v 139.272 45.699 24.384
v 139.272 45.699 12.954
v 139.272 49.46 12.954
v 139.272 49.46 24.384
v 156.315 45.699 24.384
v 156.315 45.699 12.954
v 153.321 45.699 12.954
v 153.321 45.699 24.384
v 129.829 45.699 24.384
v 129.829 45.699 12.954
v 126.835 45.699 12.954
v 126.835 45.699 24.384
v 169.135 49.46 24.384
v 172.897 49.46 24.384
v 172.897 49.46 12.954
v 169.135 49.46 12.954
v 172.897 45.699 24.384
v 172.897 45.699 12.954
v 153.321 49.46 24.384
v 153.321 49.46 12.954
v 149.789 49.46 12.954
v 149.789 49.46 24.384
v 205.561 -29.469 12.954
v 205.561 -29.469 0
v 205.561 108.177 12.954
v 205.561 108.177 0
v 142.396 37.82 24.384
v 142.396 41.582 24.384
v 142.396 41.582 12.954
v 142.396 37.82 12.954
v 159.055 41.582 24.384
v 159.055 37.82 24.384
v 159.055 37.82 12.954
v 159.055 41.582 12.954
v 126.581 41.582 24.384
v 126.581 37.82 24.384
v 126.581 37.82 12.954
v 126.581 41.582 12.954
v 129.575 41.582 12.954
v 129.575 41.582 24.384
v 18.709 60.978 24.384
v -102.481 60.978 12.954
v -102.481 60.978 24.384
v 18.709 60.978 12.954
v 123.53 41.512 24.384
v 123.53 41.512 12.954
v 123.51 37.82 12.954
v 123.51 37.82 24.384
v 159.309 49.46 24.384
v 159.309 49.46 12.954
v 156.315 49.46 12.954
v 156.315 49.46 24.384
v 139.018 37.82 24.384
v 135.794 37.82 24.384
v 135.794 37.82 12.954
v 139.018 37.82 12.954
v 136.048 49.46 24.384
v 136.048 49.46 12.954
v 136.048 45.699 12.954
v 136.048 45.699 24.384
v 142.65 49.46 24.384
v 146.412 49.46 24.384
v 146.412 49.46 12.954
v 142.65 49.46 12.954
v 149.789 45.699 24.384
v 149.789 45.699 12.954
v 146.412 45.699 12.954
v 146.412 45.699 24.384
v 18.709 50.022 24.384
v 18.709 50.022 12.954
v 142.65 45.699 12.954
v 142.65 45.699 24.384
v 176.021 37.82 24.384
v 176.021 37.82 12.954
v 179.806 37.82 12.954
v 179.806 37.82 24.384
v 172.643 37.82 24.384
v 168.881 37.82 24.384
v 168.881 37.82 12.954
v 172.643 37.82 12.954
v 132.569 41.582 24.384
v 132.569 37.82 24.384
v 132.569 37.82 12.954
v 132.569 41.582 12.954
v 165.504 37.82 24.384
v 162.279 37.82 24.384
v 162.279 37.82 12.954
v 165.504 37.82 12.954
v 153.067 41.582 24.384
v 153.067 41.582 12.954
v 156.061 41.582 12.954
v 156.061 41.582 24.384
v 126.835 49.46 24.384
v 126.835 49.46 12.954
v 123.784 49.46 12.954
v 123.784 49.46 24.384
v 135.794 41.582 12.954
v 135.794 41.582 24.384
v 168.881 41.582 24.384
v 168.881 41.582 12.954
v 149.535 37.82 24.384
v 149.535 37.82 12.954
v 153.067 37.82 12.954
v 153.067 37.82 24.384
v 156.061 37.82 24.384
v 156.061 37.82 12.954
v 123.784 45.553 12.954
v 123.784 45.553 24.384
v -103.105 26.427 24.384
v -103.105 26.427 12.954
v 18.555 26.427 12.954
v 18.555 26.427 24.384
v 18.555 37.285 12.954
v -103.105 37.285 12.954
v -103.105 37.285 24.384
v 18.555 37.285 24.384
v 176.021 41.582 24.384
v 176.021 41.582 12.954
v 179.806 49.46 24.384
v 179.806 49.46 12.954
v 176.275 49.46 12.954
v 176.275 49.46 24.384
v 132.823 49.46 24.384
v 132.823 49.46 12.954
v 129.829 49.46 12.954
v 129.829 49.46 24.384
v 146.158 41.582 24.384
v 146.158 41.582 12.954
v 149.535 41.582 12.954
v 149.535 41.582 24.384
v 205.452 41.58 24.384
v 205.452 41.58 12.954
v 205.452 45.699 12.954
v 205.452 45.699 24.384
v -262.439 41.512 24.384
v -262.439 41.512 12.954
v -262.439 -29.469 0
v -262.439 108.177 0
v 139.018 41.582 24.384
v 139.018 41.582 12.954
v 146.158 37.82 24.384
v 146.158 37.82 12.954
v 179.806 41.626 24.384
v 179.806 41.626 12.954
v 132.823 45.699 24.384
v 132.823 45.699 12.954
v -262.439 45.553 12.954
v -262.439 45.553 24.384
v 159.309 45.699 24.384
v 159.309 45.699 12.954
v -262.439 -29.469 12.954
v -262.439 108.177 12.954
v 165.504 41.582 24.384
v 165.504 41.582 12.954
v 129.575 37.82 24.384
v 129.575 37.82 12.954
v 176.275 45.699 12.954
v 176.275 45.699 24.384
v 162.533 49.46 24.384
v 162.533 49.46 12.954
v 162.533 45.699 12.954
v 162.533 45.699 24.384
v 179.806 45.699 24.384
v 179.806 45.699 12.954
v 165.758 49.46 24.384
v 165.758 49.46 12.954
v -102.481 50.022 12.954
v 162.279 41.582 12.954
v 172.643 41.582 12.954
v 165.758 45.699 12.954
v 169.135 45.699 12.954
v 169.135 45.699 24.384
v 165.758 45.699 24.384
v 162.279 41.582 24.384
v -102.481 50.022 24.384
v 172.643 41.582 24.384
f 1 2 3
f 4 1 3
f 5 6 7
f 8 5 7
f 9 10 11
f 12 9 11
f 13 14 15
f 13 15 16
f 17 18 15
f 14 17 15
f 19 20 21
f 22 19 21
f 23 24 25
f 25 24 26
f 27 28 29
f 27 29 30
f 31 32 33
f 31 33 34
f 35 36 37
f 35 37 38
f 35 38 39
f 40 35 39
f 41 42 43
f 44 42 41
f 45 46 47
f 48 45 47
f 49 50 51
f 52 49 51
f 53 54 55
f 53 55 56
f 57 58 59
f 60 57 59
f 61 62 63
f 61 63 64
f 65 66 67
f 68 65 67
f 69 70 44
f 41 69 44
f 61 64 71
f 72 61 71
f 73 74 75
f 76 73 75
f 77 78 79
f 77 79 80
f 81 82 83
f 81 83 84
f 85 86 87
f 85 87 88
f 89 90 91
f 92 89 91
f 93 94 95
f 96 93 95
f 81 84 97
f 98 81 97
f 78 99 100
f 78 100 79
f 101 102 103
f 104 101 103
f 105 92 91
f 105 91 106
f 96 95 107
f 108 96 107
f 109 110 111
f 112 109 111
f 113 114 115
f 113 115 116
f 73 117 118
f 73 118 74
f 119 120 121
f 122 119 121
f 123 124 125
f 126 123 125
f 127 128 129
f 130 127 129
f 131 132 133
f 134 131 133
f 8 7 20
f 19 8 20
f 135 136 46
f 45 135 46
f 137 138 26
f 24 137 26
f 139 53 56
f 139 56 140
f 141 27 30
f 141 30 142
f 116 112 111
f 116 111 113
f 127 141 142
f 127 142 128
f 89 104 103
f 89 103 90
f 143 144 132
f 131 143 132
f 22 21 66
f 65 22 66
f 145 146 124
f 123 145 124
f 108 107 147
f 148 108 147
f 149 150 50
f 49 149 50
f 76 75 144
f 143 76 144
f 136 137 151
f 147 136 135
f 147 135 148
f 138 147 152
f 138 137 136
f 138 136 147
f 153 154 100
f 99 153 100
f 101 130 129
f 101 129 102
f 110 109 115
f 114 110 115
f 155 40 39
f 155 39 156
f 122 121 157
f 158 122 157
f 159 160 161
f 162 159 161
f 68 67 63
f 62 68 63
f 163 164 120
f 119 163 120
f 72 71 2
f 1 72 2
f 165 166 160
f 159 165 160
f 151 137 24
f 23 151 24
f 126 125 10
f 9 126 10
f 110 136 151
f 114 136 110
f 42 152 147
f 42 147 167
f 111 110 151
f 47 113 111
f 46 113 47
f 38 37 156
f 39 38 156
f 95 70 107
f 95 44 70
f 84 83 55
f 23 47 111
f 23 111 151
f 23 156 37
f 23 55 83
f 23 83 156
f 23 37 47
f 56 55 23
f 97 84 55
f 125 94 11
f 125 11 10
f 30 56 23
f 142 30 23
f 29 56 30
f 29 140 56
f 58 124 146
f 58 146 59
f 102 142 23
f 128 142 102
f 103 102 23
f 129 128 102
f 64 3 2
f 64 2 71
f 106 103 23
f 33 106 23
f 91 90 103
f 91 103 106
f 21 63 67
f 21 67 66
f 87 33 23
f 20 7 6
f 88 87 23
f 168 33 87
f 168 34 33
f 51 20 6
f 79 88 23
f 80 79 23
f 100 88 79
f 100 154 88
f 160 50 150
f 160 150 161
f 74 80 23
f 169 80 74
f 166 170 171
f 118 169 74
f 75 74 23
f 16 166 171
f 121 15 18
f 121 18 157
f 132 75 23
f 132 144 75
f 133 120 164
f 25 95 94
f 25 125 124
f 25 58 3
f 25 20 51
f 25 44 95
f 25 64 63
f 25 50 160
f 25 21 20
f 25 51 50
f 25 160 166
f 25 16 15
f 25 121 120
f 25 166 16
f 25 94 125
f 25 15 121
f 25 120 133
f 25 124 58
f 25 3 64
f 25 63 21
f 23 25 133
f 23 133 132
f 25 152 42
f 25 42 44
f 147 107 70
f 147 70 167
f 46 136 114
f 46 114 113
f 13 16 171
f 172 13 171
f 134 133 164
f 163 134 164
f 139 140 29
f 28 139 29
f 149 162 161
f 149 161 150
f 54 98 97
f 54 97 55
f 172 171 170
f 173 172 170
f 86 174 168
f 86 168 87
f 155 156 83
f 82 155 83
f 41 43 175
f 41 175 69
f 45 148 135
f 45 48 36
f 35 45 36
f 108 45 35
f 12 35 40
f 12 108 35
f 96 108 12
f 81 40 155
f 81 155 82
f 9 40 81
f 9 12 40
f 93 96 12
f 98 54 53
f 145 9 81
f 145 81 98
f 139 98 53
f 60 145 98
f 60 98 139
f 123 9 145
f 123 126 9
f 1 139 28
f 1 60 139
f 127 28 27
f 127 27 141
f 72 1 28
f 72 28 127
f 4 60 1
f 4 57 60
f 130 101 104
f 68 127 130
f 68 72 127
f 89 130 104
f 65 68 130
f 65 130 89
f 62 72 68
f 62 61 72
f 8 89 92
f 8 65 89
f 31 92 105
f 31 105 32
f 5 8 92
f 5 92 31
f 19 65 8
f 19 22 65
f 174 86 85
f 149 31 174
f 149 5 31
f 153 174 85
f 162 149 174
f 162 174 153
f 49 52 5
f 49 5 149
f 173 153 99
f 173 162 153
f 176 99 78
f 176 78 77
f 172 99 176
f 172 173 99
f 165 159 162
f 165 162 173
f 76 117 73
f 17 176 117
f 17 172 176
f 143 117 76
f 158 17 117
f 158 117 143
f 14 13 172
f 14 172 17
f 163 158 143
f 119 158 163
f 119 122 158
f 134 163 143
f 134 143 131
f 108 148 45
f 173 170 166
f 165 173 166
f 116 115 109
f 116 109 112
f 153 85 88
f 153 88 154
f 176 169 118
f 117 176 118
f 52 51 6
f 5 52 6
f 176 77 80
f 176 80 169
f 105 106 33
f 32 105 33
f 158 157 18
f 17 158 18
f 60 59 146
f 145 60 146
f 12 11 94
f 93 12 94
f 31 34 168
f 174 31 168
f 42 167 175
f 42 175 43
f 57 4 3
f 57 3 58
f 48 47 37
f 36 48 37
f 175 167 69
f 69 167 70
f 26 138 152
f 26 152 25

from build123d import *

# Parameters (mm, degrees)
F0_W     = 468.000486
F0_H     = 137.646743
F1_DEPTH = 12.954
F2_W     = 121.189991
F2_H     = 10.956902
F2_W_2   = 121.659321
F2_H_2   = 10.858484
F3_DEPTH = 11.43


with BuildPart() as f1:
    # F0 (on Top) → F1 (new body)
    with BuildSketch(Plane.XY):
        with Locations((-28.439099, 39.354104)):
            Rectangle(F0_W, F0_H)
    extrude(amount=F1_DEPTH)

    # F2 (on face) → F3 (join)
    with BuildSketch(Plane.XY.offset(12.954)):
        Polygon((123.783911, 49.460353), (123.783911, 45.553041), (-262.439342, 45.553041), (-262.439342, 41.511512), (123.529911, 41.511512), (123.51045, 37.820112), (126.581236, 37.820112), (126.581236, 41.581829), (129.575267, 41.581829), (129.575267, 37.820112), (132.569283, 37.820112), (132.569283, 41.581829), (135.793611, 41.581829), (135.793611, 37.820112), (139.017939, 37.820112), (139.017939, 41.581829), (142.395809, 41.581829), (142.395809, 37.820112), (146.157518, 37.820112), (146.157518, 41.581829), (149.535387, 41.581829), (149.535387, 37.820112), (153.066799, 37.820112), (153.066799, 41.581829), (156.060829, 41.581829), (156.060829, 37.820112), (159.054845, 37.820112), (159.054845, 41.581829), (162.279173, 41.581829), (162.279173, 37.820112), (165.503501, 37.820112), (165.503501, 41.581829), (168.881371, 41.581829), (168.881371, 37.820112), (172.64308, 37.820112), (172.64308, 41.581829), (176.02095, 41.581829), (176.02095, 37.820112), (179.806361, 37.820112), (179.806361, 41.626252), (205.451788, 41.58025), (205.451788, 45.698637), (179.806361, 45.698637), (179.806361, 49.460353), (176.27495, 49.460353), (176.27495, 45.698637), (172.89708, 45.698637), (172.89708, 49.460353), (169.135371, 49.460353), (169.135371, 45.698637), (165.757501, 45.698637), (165.757501, 49.460353), (162.533173, 49.460353), (162.533173, 45.698637), (159.308845, 45.698637), (159.308845, 49.460353), (156.314829, 49.460353), (156.314829, 45.698637), (153.320799, 45.698637), (153.320799, 49.460353), (149.789387, 49.460353), (149.789387, 45.698637), (146.411518, 45.698637), (146.411518, 49.460353), (142.649809, 49.460353), (142.649809, 45.698637), (139.271939, 45.698637), (139.271939, 49.460353), (136.047611, 49.460353), (136.047611, 45.698637), (132.823283, 45.698637), (132.823283, 49.460353), (129.829267, 49.460353), (129.829267, 45.698637), (126.835236, 45.698637), (126.835236, 49.460353), align=None)
        with Locations((-41.886206, 55.499995)):
            Rectangle(F2_W, F2_H)
        with Locations((-42.274945, 31.855833)):
            Rectangle(F2_W_2, F2_H_2)
    extrude(amount=F3_DEPTH)


solid = f1.part
